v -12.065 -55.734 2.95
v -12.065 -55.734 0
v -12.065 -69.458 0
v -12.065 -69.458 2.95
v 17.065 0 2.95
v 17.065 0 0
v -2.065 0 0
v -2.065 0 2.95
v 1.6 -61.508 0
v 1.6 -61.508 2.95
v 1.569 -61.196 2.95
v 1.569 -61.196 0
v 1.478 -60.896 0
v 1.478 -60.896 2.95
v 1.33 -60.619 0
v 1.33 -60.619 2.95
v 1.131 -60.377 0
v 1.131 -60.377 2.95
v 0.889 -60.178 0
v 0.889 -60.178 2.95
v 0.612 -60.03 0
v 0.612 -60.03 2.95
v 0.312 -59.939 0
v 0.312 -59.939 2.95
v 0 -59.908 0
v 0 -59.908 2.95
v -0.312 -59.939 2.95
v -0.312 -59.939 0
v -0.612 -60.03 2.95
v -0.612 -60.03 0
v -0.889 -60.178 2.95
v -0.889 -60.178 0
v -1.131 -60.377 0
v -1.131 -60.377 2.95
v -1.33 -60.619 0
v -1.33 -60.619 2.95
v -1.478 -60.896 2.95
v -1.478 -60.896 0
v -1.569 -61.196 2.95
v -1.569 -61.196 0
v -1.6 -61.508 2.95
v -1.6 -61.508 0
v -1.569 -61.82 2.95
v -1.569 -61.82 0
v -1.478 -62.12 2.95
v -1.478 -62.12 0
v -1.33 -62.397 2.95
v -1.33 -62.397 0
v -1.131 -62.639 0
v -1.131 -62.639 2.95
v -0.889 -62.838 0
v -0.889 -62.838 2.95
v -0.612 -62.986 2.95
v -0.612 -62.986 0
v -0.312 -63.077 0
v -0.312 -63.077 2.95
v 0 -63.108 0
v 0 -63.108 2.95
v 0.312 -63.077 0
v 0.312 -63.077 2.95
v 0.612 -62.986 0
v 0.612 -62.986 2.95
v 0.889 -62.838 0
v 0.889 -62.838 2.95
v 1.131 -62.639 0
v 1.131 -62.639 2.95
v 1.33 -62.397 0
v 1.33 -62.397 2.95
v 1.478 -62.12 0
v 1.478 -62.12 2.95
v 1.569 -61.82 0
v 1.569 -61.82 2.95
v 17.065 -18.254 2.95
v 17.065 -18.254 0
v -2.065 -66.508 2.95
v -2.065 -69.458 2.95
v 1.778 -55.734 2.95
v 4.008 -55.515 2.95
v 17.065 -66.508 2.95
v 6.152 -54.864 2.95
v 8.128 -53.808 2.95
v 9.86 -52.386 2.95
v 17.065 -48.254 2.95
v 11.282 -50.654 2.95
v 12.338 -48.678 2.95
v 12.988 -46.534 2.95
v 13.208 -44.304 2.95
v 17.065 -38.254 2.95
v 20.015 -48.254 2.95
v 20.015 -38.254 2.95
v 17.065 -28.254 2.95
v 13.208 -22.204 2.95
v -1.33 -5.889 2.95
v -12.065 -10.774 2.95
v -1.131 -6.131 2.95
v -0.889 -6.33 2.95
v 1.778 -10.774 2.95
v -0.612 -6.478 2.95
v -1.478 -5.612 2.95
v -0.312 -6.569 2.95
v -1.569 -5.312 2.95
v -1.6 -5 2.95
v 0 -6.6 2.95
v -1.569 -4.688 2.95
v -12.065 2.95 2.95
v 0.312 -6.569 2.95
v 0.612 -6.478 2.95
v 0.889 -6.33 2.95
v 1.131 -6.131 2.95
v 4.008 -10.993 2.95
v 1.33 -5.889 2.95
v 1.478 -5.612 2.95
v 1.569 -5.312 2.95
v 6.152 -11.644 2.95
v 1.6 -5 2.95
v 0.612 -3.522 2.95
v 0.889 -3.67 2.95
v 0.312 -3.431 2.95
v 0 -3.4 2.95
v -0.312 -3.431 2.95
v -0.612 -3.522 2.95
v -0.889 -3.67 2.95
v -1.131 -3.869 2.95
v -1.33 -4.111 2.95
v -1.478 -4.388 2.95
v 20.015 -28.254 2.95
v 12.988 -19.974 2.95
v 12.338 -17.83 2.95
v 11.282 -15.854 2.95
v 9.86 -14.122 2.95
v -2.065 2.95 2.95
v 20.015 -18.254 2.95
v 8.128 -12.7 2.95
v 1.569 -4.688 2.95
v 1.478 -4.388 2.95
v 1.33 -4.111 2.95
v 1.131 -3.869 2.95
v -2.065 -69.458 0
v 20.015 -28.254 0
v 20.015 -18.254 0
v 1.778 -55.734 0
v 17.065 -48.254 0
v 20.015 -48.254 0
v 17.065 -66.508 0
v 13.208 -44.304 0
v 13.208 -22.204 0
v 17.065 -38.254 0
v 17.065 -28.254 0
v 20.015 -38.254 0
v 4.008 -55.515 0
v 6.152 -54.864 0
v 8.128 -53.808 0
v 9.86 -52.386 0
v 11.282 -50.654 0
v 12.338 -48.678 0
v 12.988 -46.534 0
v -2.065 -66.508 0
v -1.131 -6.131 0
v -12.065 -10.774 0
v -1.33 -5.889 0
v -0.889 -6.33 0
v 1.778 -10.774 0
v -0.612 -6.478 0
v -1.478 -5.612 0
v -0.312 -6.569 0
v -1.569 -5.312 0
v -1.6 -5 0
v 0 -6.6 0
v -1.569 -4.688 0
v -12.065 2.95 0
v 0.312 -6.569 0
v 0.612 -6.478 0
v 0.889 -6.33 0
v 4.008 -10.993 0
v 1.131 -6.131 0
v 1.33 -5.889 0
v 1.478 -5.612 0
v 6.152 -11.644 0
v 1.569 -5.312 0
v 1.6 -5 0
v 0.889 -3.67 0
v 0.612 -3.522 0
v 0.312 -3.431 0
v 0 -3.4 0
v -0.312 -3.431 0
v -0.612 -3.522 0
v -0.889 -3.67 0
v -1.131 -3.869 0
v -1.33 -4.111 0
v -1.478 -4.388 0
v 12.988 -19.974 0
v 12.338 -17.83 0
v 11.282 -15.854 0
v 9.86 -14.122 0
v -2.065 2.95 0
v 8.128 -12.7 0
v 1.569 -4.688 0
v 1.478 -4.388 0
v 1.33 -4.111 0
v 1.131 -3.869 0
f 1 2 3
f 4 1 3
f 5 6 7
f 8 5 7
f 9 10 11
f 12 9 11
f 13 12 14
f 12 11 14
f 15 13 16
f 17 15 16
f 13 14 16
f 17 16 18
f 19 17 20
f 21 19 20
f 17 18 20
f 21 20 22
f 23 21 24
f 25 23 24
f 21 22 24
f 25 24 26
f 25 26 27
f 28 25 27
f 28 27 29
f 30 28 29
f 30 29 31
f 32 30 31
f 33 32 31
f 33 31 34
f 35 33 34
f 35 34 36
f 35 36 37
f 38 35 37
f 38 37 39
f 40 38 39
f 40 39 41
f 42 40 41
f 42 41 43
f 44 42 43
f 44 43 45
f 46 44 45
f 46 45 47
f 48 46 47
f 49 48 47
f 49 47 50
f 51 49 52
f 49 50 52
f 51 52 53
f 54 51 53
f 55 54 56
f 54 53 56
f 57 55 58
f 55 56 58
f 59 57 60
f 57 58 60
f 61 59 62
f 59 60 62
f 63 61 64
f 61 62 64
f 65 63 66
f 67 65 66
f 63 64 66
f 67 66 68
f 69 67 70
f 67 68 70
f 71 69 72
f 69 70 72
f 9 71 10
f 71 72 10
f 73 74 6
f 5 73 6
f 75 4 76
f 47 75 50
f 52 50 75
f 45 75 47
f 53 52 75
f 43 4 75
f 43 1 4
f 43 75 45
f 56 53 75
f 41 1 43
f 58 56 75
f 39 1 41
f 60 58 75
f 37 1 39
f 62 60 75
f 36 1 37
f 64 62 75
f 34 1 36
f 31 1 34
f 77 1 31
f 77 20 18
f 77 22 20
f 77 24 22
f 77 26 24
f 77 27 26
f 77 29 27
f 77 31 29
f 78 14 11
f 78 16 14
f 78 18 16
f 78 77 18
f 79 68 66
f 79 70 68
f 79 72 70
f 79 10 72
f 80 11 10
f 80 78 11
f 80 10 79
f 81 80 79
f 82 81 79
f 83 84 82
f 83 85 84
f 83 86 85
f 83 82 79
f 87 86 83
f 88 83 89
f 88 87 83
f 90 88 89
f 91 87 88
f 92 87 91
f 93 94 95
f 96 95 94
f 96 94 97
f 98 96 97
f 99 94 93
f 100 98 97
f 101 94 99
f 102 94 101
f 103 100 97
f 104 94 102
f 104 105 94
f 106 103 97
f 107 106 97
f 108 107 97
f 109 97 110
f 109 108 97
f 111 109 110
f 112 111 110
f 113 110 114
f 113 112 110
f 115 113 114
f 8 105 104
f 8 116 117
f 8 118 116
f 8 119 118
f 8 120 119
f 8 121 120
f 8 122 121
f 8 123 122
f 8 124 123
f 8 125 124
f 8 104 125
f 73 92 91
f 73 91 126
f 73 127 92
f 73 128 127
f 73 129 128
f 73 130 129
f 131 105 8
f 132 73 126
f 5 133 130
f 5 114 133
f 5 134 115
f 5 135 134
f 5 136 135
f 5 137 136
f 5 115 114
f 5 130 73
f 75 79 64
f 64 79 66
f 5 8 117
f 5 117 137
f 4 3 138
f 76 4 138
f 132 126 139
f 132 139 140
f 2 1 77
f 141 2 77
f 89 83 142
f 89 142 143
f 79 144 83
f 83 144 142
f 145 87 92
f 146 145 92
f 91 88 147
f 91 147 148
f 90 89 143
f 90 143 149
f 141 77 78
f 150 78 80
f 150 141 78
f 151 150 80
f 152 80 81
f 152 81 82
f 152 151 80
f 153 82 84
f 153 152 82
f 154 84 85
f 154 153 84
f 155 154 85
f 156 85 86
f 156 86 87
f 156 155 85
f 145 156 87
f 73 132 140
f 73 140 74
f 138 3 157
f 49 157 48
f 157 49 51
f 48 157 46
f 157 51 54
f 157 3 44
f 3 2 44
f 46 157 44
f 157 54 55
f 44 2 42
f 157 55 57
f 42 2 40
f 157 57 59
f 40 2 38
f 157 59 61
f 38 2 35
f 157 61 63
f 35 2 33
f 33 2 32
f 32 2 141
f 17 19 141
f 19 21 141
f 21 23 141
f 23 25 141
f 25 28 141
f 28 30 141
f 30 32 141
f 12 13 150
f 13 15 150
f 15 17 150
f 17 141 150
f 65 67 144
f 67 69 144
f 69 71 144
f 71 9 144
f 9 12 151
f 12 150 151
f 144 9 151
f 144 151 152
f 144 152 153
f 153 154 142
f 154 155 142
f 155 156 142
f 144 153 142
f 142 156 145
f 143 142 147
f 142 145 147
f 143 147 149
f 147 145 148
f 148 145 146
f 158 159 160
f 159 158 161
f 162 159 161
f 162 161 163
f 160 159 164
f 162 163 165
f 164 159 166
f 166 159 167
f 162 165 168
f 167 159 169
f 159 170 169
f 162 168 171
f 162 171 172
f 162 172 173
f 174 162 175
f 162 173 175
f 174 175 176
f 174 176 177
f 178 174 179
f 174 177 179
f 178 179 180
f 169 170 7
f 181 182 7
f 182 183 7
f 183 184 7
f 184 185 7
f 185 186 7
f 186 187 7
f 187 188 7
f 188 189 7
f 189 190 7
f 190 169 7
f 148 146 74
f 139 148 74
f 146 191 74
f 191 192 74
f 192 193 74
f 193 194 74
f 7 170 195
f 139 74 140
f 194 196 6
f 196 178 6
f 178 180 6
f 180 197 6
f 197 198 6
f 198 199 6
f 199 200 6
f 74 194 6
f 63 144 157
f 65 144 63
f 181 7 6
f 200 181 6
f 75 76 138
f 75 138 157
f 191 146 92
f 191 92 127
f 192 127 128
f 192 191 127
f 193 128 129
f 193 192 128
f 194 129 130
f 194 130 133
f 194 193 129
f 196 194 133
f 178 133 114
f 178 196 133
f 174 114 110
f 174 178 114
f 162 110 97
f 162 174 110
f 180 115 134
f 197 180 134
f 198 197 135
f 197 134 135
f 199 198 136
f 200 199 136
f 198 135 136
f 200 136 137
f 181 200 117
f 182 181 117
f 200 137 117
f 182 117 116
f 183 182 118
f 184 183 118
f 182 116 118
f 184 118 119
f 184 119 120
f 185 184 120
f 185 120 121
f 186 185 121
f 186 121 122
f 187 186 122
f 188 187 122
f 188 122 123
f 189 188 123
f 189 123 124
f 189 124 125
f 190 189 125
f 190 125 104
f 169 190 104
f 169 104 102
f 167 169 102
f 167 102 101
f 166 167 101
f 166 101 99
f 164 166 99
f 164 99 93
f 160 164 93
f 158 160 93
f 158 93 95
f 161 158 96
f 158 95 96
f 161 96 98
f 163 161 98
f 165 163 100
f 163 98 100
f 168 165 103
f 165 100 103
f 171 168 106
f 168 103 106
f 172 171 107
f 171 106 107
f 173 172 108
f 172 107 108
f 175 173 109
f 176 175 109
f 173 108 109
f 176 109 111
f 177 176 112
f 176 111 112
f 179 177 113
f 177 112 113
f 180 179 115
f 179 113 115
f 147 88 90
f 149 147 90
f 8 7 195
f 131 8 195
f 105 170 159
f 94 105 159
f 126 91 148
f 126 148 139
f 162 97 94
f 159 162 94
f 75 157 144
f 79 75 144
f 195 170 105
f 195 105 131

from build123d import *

# Parameters (mm, degrees)
SKETCH1_W           = 10
SKETCH1_H           = 2.95
BOSS_EXTRUDE1_DEPTH = 2.95
CUT_EXTRUDE1_DEPTH  = 3.95
FILLET1_R           = 11.43
SKETCH3_W           = 2.95
SKETCH3_H           = 10
BOSS_EXTRUDE2_DEPTH = 2.95
SKETCH4_R           = 1.6
CUT_EXTRUDE2_DEPTH  = 3.95


with BuildPart() as part:
    # Sketch1 → Boss-Extrude1 (new body)
    with BuildSketch(Plane.XY):
        Polygon((-2.065, 0), (-12.065, 0), (-12.065, -66.508), (-2.065, -66.508), (17.065, -66.508), (17.065, 0), align=None)
        with Locations((-7.065, 1.475)):
            Rectangle(SKETCH1_W, SKETCH1_H)
        with Locations((-7.065, -67.983)):
            Rectangle(SKETCH1_W, SKETCH1_H)
    extrude(amount=BOSS_EXTRUDE1_DEPTH)

    # Sketch2 → Cut-Extrude1 (cut, through all)
    with BuildSketch(Plane.XY.offset(2.95)):
        Polygon((13.208, -10.773769685), (12.346170522, -10.773769685), (-7.346170522, -55.734230315), (13.208, -55.734230315), align=None)
        Polygon((-7.346170522, -55.734230315), (12.346170522, -10.773769685), (-12.065, -10.773769685), (-12.065, -55.734230315), align=None)
    extrude(amount=-CUT_EXTRUDE1_DEPTH, mode=Mode.SUBTRACT)

    # Fillet1
    fillet1_edges = [part.edges().sort_by_distance(p)[0] for p in [
        (13.208, -10.773769685, 1.475),
        (13.208, -55.734230315, 1.475),
    ]]
    fillet(fillet1_edges, radius=FILLET1_R)

    # Sketch3 → Boss-Extrude2 (add)
    with BuildSketch(Plane.XY.offset(2.95)):
        with BuildLine():
            Line((17.065, -48.254), (17.065, -38.254))
            Line((17.065, -38.254), (17.065, -28.254))
            Line((17.065, -28.254), (17.065, -18.254))
            Line((17.065, -18.254), (12.503866838, -18.254))
            ThreePointArc((12.503866838, -18.254), (13.030589879, -20.197748494), (13.208, -22.203769685))
            Line((13.208, -22.203769685), (13.208, -44.304230315))
            ThreePointArc((13.208, -44.304230315), (13.030589879, -46.310251506), (12.503866838, -48.254))
            Line((12.503866838, -48.254), (17.065, -48.254))
        make_face()
        with Locations((18.54, -23.254)):
            Rectangle(SKETCH3_W, SKETCH3_H)
        with Locations((18.54, -43.254)):
            Rectangle(SKETCH3_W, SKETCH3_H)
    extrude(amount=-BOSS_EXTRUDE2_DEPTH)

    # Sketch4 → Cut-Extrude2 (cut, through all)
    with BuildSketch(Plane.XY.offset(2.95)):
        with Locations((0, -61.508)):
            Circle(SKETCH4_R)
        with Locations((0, -5)):
            Circle(SKETCH4_R)
    extrude(amount=-CUT_EXTRUDE2_DEPTH, mode=Mode.SUBTRACT)


solid = part.part
